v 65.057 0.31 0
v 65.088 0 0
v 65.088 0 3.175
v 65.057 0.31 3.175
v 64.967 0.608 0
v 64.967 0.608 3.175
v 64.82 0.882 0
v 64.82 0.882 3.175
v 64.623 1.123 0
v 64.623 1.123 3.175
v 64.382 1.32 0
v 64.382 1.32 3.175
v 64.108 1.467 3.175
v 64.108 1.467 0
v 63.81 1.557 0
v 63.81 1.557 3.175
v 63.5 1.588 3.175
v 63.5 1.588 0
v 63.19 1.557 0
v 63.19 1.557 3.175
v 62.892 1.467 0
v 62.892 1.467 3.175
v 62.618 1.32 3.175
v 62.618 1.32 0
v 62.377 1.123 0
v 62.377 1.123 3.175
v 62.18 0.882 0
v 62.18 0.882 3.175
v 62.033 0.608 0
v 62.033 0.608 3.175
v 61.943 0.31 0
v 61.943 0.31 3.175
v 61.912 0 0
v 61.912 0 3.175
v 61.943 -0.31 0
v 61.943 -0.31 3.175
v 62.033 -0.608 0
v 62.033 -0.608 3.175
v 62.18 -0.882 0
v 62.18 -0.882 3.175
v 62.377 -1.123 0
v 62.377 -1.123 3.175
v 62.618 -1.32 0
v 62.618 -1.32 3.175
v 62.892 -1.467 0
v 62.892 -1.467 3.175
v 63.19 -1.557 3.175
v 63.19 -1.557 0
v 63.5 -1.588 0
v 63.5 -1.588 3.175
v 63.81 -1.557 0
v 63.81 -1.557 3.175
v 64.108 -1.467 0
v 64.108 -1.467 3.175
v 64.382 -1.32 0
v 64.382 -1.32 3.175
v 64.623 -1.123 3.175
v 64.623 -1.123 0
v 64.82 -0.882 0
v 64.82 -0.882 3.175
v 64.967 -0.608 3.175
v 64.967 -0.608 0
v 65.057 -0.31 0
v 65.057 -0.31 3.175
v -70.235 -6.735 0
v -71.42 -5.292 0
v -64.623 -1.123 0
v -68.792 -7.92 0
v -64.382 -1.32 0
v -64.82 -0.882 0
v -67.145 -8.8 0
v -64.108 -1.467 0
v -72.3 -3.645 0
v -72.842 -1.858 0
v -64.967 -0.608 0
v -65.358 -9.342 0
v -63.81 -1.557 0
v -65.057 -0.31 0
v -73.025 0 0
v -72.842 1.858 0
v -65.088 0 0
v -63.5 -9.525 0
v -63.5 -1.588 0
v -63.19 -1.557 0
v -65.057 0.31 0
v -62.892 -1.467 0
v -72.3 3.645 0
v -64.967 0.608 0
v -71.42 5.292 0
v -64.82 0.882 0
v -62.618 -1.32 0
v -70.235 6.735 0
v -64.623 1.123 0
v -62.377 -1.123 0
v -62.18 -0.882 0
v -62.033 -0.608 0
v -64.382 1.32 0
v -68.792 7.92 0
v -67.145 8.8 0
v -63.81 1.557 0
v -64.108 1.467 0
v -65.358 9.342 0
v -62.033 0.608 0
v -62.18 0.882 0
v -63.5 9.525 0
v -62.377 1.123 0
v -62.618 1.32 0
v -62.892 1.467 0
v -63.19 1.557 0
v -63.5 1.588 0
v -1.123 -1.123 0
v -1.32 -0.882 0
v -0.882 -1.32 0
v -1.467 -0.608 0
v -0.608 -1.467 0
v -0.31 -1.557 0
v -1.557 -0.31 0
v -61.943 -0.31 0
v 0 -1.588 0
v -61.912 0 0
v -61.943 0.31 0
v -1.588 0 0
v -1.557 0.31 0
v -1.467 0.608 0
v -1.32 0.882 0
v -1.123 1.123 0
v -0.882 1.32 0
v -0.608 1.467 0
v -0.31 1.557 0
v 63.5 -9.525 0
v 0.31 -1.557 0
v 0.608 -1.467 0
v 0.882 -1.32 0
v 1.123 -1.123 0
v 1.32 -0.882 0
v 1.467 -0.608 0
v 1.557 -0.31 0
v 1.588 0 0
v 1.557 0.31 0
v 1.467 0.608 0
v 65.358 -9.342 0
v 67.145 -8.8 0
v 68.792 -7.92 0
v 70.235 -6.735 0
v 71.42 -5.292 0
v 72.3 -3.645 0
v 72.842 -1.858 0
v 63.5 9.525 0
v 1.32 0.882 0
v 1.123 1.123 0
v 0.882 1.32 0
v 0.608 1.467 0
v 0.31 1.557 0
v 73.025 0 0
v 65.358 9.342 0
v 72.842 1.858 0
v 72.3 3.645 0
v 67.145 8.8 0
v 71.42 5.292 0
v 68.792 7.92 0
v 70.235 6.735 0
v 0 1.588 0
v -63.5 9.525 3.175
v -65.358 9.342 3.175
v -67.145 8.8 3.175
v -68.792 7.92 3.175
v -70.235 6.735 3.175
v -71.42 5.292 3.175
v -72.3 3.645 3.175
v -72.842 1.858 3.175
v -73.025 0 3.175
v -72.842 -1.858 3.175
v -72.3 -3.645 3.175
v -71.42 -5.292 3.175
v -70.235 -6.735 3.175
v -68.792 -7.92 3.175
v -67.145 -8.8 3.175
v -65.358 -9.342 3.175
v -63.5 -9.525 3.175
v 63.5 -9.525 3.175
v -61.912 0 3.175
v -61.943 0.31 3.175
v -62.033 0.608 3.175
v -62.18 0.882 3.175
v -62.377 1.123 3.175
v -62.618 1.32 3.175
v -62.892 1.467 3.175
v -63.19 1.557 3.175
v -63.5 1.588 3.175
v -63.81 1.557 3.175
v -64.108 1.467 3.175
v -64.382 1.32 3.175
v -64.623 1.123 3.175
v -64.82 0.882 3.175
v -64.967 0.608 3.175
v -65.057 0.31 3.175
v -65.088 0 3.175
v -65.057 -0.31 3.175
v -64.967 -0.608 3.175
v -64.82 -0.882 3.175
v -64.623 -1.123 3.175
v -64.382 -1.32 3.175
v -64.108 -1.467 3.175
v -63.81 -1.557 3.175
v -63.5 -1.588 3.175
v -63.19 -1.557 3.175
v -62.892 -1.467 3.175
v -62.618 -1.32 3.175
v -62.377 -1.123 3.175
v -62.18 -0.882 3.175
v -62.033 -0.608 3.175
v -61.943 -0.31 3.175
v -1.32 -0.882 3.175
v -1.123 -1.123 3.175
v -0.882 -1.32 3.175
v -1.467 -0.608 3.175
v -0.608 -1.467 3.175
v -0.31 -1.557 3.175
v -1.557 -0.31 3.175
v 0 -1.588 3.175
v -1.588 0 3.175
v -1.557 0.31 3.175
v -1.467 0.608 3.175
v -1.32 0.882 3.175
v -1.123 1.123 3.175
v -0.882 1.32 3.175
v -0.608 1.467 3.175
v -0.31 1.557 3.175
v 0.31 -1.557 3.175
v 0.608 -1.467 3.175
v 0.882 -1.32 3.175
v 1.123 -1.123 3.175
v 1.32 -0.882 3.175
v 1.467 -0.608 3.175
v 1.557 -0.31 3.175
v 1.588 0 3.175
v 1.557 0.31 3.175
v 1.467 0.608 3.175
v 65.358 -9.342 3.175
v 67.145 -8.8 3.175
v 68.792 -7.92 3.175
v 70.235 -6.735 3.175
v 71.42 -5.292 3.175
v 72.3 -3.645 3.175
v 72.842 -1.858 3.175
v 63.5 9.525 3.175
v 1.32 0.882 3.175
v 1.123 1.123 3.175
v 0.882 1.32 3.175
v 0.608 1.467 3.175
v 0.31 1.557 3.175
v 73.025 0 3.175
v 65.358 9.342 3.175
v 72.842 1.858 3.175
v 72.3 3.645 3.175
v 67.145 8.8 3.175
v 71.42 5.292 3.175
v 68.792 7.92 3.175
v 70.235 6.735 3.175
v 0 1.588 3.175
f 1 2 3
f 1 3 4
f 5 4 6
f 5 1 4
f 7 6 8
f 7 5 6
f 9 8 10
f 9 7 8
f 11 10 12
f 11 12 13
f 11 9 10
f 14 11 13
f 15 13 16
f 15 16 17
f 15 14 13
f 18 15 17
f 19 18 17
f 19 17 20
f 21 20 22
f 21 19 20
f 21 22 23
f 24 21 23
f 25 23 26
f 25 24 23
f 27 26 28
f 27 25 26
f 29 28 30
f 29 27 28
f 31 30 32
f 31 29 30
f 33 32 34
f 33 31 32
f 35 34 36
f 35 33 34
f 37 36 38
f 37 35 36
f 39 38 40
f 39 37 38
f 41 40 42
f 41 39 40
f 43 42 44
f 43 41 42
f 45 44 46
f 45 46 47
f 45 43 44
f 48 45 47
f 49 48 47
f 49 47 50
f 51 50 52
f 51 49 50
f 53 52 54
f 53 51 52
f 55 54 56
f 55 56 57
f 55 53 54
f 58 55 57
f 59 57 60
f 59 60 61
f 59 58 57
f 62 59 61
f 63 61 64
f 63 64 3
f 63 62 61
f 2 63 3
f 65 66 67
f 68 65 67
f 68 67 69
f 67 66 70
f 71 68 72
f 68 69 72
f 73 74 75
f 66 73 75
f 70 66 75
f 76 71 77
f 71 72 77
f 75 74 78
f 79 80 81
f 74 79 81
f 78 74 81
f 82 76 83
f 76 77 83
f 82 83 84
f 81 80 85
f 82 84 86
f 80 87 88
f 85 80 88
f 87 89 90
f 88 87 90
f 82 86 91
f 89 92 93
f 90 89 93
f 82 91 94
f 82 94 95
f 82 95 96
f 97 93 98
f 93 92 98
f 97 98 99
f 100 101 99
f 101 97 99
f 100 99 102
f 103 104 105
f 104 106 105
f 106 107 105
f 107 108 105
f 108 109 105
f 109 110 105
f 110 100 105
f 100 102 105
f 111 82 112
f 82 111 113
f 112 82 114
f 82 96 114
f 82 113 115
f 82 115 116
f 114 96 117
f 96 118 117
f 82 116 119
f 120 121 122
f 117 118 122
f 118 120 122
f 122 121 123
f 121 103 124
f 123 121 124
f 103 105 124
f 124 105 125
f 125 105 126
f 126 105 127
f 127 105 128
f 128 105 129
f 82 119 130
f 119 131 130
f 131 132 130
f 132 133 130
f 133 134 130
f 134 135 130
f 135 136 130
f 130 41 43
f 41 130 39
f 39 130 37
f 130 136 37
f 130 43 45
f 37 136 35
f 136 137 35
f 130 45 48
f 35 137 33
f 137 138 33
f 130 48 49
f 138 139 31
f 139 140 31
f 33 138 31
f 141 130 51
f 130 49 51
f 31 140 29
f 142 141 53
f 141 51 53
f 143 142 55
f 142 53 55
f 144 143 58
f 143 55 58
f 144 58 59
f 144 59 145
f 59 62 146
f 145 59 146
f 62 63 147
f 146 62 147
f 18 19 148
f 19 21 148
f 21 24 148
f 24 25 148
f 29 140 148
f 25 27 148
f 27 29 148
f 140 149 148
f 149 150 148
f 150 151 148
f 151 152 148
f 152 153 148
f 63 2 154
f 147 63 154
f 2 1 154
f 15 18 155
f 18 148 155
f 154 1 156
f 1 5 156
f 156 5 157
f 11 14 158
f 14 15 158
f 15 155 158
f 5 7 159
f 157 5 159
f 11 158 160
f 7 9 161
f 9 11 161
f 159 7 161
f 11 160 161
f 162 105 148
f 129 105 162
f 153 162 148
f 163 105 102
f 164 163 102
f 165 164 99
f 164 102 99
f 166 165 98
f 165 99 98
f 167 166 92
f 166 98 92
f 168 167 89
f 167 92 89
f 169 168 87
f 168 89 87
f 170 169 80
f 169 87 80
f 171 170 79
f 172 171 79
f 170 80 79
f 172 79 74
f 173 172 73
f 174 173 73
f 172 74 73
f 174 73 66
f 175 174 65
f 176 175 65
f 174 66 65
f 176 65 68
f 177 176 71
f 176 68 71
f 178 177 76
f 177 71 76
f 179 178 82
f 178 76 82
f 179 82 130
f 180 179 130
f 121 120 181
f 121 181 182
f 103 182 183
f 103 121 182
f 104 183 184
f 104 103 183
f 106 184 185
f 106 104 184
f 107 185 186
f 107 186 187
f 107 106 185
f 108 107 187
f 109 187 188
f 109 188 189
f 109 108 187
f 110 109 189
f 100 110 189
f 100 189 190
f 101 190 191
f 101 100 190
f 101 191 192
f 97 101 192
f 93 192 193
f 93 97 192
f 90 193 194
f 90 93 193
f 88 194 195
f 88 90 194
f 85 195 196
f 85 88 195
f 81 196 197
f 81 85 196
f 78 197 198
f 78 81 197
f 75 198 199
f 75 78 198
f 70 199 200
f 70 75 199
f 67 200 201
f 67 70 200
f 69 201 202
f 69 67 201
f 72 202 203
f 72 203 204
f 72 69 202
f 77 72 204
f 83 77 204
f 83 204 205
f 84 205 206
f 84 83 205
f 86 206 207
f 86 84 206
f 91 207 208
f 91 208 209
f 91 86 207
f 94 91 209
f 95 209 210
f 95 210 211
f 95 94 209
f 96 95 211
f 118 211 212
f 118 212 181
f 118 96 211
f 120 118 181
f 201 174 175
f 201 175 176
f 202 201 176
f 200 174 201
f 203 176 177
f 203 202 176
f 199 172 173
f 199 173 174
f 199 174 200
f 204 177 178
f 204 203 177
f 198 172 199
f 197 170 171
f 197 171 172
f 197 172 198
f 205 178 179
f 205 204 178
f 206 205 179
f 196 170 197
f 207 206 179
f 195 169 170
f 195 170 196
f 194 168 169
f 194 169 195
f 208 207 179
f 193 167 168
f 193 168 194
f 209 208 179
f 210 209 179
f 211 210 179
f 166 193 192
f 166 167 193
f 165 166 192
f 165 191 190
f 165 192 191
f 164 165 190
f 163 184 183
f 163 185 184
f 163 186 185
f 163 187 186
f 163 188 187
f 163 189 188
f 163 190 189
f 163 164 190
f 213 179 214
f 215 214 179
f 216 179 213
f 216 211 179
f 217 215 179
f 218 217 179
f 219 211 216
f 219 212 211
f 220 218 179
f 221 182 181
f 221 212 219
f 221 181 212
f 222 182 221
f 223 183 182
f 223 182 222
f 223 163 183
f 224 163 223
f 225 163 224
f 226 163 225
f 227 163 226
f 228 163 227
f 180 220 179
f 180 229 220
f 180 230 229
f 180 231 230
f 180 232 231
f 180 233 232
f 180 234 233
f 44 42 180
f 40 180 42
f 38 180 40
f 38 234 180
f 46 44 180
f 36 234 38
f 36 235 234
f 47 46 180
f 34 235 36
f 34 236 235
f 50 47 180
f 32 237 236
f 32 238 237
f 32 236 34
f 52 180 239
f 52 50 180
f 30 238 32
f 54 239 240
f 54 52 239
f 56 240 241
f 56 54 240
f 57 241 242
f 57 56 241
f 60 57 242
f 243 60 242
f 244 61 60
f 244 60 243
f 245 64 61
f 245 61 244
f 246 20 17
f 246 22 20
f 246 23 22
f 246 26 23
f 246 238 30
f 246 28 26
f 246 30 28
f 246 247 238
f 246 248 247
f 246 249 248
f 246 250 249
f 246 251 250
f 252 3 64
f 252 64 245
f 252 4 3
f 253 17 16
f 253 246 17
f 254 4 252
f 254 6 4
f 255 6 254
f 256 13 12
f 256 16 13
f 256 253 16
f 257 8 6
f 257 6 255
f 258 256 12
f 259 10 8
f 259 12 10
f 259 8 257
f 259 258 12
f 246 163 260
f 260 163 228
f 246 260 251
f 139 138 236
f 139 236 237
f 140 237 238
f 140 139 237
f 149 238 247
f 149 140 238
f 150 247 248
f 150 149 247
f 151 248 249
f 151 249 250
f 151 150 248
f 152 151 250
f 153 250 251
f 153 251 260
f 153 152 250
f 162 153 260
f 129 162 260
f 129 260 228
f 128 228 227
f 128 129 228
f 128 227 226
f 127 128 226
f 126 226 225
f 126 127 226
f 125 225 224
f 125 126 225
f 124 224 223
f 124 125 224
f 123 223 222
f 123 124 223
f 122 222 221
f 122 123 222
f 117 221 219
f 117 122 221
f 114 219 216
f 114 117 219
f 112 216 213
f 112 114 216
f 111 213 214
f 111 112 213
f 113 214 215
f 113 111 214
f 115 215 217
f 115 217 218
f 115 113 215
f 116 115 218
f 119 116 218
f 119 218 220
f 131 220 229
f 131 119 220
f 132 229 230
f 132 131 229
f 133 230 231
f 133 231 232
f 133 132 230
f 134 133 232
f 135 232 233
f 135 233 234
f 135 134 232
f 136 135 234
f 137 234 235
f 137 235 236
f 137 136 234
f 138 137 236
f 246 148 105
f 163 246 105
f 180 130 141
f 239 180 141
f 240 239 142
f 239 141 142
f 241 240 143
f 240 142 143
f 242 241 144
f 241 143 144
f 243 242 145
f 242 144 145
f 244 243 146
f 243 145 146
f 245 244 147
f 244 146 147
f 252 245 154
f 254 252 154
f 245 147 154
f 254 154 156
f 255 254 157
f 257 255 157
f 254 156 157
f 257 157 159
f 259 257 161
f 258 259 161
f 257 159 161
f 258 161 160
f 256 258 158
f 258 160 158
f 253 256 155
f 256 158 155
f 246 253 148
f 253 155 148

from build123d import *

# Parameters (mm, degrees)
F0_R     = 1.5875
F1_DEPTH = 3.175


with BuildPart() as f1:
    # F0 (on Top) → F1 (new body)
    with BuildSketch(Plane.XY):
        with BuildLine():
            ThreePointArc((63.5, -9.525), (73.025, 0), (63.5, 9.525))
            Line((63.5, 9.525), (-63.5, 9.525))
            ThreePointArc((-63.5, 9.525), (-73.025, 0), (-63.5, -9.525))
            Line((-63.5, -9.525), (63.5, -9.525))
        make_face()
        with Locations((-63.5, 0)):
            Circle(F0_R, mode=Mode.SUBTRACT)
        Circle(F0_R, mode=Mode.SUBTRACT)
        with Locations((63.5, 0)):
            Circle(F0_R, mode=Mode.SUBTRACT)
    extrude(amount=F1_DEPTH)


solid = f1.part
